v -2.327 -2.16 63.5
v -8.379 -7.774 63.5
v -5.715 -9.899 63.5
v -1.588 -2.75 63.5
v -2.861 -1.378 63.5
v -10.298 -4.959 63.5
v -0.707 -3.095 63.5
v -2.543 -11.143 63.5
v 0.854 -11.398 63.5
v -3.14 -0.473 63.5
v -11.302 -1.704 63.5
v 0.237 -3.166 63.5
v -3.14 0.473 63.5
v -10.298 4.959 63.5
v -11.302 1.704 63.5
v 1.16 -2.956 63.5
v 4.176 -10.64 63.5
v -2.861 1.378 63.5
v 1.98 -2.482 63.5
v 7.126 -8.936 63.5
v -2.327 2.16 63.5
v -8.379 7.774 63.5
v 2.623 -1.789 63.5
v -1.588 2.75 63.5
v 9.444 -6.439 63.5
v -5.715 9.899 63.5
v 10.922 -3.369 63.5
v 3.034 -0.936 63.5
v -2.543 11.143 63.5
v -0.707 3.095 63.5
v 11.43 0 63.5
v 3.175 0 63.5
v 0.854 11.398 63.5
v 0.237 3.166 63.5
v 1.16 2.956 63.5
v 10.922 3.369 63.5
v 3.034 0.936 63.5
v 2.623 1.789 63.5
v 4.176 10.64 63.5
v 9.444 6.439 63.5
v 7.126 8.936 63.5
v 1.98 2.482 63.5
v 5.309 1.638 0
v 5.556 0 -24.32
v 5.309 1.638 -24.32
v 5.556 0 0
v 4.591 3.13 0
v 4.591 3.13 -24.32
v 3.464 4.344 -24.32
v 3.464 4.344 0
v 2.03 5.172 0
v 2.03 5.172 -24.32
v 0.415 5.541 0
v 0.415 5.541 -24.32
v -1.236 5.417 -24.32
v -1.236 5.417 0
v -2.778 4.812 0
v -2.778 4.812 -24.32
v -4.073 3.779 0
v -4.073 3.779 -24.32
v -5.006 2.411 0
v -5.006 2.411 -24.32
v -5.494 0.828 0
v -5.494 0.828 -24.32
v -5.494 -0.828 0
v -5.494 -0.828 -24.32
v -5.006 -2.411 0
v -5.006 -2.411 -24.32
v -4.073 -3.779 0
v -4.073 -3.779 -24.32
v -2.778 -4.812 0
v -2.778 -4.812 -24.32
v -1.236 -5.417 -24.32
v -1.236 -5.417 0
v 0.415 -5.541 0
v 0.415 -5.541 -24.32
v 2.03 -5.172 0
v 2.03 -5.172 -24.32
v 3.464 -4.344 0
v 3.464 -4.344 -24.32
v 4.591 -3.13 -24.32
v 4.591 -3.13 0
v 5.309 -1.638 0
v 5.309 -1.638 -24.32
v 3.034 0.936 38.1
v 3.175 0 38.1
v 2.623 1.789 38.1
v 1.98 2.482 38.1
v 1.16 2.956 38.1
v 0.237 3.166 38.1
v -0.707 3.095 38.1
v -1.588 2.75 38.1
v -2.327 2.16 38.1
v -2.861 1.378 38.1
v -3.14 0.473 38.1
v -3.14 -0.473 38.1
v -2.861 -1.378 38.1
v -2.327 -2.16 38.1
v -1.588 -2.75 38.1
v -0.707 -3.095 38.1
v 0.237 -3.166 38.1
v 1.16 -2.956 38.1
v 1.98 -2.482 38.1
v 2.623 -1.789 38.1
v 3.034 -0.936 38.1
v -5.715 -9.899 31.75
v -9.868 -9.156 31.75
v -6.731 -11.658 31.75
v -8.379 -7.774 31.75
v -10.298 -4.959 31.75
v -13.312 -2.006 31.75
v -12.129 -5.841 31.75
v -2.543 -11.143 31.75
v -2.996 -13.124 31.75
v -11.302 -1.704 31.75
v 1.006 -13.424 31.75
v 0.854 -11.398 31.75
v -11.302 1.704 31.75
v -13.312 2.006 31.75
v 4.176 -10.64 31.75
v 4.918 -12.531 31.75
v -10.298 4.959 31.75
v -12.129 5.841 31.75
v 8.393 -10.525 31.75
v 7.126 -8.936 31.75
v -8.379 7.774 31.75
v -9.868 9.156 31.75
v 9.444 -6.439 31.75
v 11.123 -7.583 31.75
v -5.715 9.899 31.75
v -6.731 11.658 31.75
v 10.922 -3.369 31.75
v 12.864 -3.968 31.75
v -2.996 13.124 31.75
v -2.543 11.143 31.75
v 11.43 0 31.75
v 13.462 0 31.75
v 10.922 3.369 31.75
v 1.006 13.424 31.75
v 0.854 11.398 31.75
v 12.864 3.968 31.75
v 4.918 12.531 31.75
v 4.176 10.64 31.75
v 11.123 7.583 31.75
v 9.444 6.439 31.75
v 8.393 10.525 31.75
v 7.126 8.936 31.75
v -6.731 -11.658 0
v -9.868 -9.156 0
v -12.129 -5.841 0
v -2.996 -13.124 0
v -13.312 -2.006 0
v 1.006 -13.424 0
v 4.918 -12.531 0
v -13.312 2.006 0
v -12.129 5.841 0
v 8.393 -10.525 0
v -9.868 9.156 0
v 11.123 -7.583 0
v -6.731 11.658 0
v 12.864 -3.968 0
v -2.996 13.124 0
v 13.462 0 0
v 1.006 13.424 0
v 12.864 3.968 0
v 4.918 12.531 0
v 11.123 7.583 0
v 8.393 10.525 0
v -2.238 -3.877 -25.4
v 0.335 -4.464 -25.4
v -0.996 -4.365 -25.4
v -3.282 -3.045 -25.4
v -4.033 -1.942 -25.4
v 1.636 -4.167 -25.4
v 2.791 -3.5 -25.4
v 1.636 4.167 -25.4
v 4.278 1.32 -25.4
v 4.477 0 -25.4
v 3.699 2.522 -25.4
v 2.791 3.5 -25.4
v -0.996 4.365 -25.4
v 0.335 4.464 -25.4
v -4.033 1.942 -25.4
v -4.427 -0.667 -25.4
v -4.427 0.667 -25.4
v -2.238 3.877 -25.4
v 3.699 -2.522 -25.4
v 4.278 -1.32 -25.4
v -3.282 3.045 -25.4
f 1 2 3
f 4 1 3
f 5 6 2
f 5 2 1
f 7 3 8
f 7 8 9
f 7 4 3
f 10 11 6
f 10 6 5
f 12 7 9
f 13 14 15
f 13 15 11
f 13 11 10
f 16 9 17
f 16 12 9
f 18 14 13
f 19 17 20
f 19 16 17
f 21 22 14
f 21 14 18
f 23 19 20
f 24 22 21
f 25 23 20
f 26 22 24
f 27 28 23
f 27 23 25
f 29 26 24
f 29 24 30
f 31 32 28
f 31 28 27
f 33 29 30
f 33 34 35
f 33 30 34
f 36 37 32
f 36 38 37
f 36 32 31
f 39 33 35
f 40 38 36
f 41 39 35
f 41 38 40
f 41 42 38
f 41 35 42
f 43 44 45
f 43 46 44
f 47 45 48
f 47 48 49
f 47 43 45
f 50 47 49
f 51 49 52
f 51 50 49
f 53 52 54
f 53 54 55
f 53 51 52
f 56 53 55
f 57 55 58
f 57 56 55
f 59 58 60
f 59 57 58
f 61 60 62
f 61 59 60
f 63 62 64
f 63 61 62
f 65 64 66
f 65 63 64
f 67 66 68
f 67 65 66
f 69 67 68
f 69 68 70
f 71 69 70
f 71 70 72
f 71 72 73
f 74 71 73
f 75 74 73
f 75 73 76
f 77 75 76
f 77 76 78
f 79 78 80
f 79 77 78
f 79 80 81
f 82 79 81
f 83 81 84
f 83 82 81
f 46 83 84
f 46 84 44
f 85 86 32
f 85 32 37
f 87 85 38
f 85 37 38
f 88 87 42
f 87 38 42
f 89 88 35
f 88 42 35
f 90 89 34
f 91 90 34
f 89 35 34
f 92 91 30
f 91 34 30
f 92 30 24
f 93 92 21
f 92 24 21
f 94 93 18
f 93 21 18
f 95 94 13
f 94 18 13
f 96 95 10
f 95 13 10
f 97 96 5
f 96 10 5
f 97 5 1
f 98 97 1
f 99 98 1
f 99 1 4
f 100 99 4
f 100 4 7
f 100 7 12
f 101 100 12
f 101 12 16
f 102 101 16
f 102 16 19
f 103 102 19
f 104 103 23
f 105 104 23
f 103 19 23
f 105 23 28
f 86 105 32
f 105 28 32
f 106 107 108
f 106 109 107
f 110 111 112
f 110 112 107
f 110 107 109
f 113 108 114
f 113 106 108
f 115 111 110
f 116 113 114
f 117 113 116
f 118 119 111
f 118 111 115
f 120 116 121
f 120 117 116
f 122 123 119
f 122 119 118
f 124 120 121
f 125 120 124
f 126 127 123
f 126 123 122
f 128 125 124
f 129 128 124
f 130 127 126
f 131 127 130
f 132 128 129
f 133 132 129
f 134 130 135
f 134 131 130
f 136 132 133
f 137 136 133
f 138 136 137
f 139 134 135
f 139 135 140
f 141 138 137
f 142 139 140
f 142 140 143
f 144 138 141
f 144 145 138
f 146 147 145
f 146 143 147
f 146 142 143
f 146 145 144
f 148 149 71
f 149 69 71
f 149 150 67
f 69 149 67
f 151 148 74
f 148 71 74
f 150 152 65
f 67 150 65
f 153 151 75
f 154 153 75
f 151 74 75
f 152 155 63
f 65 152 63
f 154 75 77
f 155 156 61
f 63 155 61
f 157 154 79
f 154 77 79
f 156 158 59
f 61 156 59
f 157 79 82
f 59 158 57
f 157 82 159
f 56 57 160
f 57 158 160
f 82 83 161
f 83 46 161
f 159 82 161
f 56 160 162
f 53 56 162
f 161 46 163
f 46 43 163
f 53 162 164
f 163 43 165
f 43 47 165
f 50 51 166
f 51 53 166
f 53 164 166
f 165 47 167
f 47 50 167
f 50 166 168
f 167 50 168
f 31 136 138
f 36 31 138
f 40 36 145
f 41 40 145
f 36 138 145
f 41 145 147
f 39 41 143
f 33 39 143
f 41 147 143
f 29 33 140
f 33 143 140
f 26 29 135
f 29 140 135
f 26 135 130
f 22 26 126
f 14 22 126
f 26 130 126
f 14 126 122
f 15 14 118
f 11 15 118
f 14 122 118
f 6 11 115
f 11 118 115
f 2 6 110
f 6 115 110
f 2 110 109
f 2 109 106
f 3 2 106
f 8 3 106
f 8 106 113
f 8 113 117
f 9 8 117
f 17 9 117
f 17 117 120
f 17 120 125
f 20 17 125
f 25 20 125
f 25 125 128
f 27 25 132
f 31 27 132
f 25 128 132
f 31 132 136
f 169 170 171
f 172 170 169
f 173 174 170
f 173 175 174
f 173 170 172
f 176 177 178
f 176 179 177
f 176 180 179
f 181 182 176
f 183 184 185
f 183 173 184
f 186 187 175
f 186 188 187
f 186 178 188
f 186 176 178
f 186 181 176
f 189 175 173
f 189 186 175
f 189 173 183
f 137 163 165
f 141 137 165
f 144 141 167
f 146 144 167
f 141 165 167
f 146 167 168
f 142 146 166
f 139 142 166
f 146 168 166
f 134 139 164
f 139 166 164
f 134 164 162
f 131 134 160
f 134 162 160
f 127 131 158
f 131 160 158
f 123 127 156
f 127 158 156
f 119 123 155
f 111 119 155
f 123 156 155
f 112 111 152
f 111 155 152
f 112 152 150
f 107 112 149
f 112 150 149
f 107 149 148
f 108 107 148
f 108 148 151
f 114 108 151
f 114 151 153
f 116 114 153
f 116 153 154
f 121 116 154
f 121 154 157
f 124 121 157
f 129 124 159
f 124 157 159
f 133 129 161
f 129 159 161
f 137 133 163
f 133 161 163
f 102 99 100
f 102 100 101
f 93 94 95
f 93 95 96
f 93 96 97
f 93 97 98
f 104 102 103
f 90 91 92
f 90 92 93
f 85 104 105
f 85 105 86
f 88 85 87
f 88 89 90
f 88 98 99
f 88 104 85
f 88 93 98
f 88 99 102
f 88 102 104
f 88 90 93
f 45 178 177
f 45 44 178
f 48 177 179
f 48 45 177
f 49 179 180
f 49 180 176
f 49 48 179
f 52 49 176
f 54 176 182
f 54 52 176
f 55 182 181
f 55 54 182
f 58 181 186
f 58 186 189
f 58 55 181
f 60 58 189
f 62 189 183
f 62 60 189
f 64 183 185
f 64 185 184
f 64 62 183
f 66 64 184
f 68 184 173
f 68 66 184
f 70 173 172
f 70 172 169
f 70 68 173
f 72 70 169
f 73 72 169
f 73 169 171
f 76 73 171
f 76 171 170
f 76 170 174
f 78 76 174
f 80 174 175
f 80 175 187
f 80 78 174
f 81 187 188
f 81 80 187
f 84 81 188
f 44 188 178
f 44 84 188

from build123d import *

# Parameters (mm, degrees)
SKETCH1_R           = 13.462
BOSS_EXTRUDE1_DEPTH = 31.75
SKETCH2_R           = 11.43
BOSS_EXTRUDE2_DEPTH = 31.75
SKETCH3_R           = 3.175
CUT_EXTRUDE1_DEPTH  = 25.4


# Read off the part's stored shape, not the designer's step: 7/16-14 Machine Threads Stud1
with BuildPart() as part:
    # Sketch1 → Boss-Extrude1 (new body)
    with BuildSketch(Plane.XY):
        Circle(SKETCH1_R)
    extrude(amount=BOSS_EXTRUDE1_DEPTH)

    # Sketch2 → Boss-Extrude2 (add)
    with BuildSketch(Plane.XY.offset(31.75)):
        Circle(SKETCH2_R)
    extrude(amount=BOSS_EXTRUDE2_DEPTH)

    # Sketch3 → Cut-Extrude1 (cut)
    with BuildSketch(Plane.XY.offset(63.5)):
        Circle(SKETCH3_R)
    extrude(amount=-CUT_EXTRUDE1_DEPTH, mode=Mode.SUBTRACT)

    # 7/16-14 Machine Threads Stud1 outline → 7/16-14 Machine Threads Stud1 (revolve)
    with BuildSketch(Plane.XZ):
        Polygon((0, 0), (0, -25.4), (4.47675, -25.4), (5.55625, -24.3205), (5.55625, 0), align=None)
    revolve(axis=Axis((0, 0, 0), (0, 0, 1)))


solid = part.part
